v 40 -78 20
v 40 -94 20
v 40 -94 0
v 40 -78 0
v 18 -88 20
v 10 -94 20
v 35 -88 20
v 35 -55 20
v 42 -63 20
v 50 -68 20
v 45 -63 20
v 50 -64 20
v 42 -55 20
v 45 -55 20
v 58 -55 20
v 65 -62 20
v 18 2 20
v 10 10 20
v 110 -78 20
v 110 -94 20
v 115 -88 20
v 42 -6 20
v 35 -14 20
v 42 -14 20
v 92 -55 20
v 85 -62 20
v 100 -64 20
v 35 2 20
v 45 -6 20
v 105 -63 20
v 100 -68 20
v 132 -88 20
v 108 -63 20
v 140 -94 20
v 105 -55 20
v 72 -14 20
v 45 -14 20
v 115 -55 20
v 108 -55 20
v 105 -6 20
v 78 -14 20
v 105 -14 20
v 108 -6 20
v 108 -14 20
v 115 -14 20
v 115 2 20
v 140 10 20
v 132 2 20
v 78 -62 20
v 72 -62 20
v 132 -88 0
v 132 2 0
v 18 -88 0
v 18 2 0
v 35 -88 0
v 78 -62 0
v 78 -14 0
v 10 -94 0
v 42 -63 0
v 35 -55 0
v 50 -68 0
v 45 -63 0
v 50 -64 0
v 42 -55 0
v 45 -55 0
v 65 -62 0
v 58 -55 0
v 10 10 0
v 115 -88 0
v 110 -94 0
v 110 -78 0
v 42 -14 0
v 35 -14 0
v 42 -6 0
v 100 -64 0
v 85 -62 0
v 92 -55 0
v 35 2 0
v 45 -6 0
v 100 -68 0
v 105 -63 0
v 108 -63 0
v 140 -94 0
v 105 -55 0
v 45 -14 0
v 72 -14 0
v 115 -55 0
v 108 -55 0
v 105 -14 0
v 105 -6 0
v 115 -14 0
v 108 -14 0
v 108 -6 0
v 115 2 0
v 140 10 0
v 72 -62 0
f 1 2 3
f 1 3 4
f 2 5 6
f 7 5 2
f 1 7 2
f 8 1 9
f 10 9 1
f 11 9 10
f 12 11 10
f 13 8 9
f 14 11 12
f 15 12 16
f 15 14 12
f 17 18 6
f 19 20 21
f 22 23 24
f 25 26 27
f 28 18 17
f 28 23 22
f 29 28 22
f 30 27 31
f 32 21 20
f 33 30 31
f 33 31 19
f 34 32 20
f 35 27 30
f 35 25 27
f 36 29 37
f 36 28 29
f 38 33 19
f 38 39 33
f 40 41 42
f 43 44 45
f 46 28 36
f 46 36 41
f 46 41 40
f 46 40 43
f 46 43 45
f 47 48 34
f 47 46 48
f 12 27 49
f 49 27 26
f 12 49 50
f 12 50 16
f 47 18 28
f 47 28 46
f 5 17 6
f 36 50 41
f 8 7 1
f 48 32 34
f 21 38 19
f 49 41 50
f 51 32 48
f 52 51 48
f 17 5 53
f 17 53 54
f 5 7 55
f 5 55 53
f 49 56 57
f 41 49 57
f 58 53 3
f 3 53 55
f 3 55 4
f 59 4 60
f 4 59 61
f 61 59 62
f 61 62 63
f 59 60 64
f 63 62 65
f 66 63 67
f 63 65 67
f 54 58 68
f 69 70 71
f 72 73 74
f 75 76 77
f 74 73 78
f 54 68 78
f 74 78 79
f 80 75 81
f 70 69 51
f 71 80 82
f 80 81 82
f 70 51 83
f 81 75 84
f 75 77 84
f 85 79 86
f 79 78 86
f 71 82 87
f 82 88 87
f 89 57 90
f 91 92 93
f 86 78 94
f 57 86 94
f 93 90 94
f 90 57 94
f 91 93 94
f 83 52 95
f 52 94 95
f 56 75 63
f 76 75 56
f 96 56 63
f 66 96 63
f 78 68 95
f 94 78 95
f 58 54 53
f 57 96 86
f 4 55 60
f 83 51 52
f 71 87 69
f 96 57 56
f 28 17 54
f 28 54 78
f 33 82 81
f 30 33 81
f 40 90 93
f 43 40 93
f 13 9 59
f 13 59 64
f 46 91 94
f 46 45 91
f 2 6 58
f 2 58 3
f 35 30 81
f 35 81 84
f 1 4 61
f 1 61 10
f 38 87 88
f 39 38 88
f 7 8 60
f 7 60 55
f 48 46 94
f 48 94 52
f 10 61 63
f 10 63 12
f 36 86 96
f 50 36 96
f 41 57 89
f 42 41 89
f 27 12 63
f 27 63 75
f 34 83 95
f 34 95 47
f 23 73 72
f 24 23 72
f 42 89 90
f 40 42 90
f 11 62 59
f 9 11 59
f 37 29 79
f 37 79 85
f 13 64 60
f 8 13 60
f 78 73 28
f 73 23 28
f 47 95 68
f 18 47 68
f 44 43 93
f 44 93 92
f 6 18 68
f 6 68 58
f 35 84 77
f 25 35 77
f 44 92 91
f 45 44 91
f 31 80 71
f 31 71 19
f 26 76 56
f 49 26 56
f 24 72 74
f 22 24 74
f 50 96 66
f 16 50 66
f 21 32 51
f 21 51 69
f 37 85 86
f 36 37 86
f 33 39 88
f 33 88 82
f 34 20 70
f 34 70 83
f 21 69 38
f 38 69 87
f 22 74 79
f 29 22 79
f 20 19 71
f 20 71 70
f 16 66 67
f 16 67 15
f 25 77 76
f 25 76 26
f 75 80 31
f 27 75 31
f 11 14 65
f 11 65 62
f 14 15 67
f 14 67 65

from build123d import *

# Parameters (mm, degrees)
F1_DEPTH  = 20
F2_DEPTH  = 12
F3_DEPTH  = 10
F4_DEPTH  = 10
F5_W      = 25
F5_H      = 20
F6_DEPTH  = 14
F7_SIZE   = 10
F8_SIZE   = 6.99999
F9_DEPTH  = 10
F10_W     = 17
F10_H     = 80
F11_DEPTH = 20.001
F13_DEPTH = 20


# Not quite as in the source:
# - a fillet or chamfer is up to 0.001 mm smaller than in the source, because OpenCascade refuses the exact size
# - a feature names something its author has since deleted; it is built from what else it names


with BuildPart() as f1:
    # F0 (on Top) → F1 (new body)
    with BuildSketch(Plane.XY):
        Polygon((78, -43.2), (75, -45), (78, -45), align=None)
        Polygon((33.3333333333, -20), (0, 0), (0, -90), (33.3333333333, -70), (25, -70), (25, -20), align=None)
        Polygon((150, -90), (150, 0), (116.6666666667, -20), (125, -20), (125, -70), (116.6666666667, -70), align=None)
        Polygon((75, 0), (0, 0), (33.3333333333, -20), (35, -20), (35, -14), (42, -14), (42, -6), (45, -6), (45, -14), (72, -14), (72, -43.2), (75, -45), align=None)
        Polygon((150, 0), (75, 0), (75, -45), (78, -43.2), (78, -14), (105, -14), (105, -6), (108, -6), (108, -14), (115, -14), (115, -20), (116.6666666667, -20), align=None)
        Polygon((78, -45), (75, -45), (78, -46.8), align=None)
        Polygon((72, -45), (75, -45), (72, -43.2), align=None)
        Polygon((72, -46.8), (75, -45), (72, -45), align=None)
        Polygon((78, -46.8), (75, -45), (75, -90), (150, -90), (116.6666666667, -70), (115, -70), (115, -69), (105, -63), (91.6666666667, -55), (85, -55), (85, -62), (78, -62), (78, -55), (78, -48), align=None)
        Polygon((33.3333333333, -70), (0, -90), (75, -90), (75, -45), (72, -46.8), (72, -48), (72, -55), (72, -62), (65, -62), (65, -55), (58.3333333333, -55), (45, -63), (35, -69), (35, -70), align=None)
        Polygon((35, -55), (35, -69), (45, -63), (42, -63), (42, -55), align=None)
        Polygon((45, -63), (58.3333333333, -55), (45, -55), align=None)
        Polygon((105, -55), (91.6666666667, -55), (105, -63), align=None)
        Polygon((105, -63), (115, -69), (115, -55), (108, -55), (108, -63), align=None)
    extrude(amount=F1_DEPTH)

    # F2 (cut): a face of the model
    f2_faces = [f1.faces().sort_by_distance(p)[0] for p in [
        (75, -90, 10),
    ]]
    extrude(f2_faces, amount=-F2_DEPTH, mode=Mode.SUBTRACT)

    # F3 (cut): a face of the model
    f3_faces = [f1.faces().sort_by_distance(p)[0] for p in [
        (150, -39, 10),
    ]]
    extrude(f3_faces, amount=-F3_DEPTH, mode=Mode.SUBTRACT)

    # F4 (cut): a face of the model
    f4_faces = [f1.faces().sort_by_distance(p)[0] for p in [
        (0, -39, 10),
    ]]
    extrude(f4_faces, amount=-F4_DEPTH, mode=Mode.SUBTRACT)

    # F5 (on face) → F6 (cut)
    with BuildSketch(Plane.XZ.offset(78)):
        with Locations((87.5, 10)):
            Rectangle(F5_W, F5_H)
        with Locations((62.5, 10)):
            Rectangle(F5_W, F5_H)
    extrude(amount=-F6_DEPTH, mode=Mode.SUBTRACT)

    # F7
    f7_edges = [f1.edges().sort_by_distance(p)[0] for p in [
        (100, -78, 10),
        (50, -78, 10),
    ]]
    chamfer(f7_edges, length=F7_SIZE)

    # F8 (size 7 in the source; OpenCascade refuses exactly that, so slightly less here)
    f8_edges = [f1.edges().sort_by_distance(p)[0] for p in [
        (85, -55, 10),
        (65, -55, 10),
    ]]
    chamfer(f8_edges, length=F8_SIZE)

    # F9 (add): a face of the model
    f9_faces = [f1.faces().sort_by_distance(p)[0] for p in [
        (75, 0, 10),
    ]]
    extrude(f9_faces, amount=F9_DEPTH)

    # F10 (on face) → F11 (cut, through all)
    with BuildSketch(Plane.XY.offset(20)):
        with Locations((26.5, -38)):
            Rectangle(F10_W, F10_H)
        with Locations((123.5, -38)):
            Rectangle(F10_W, F10_H)
    extrude(amount=-F11_DEPTH, mode=Mode.SUBTRACT)

    # F12 (on face) → F13 (join)
    with BuildSketch(Plane.XY.offset(20)):
        Polygon((18, -88), (18, -78), (10, -78), (10, -94), (40, -94), (40, -78), (35, -78), (35, -88), align=None)
        Polygon((140, -94), (140, -78), (132, -78), (132, -88), (115, -88), (115, -78), (110, -78), (110, -94), align=None)
    extrude(amount=-F13_DEPTH)


solid = f1.part
